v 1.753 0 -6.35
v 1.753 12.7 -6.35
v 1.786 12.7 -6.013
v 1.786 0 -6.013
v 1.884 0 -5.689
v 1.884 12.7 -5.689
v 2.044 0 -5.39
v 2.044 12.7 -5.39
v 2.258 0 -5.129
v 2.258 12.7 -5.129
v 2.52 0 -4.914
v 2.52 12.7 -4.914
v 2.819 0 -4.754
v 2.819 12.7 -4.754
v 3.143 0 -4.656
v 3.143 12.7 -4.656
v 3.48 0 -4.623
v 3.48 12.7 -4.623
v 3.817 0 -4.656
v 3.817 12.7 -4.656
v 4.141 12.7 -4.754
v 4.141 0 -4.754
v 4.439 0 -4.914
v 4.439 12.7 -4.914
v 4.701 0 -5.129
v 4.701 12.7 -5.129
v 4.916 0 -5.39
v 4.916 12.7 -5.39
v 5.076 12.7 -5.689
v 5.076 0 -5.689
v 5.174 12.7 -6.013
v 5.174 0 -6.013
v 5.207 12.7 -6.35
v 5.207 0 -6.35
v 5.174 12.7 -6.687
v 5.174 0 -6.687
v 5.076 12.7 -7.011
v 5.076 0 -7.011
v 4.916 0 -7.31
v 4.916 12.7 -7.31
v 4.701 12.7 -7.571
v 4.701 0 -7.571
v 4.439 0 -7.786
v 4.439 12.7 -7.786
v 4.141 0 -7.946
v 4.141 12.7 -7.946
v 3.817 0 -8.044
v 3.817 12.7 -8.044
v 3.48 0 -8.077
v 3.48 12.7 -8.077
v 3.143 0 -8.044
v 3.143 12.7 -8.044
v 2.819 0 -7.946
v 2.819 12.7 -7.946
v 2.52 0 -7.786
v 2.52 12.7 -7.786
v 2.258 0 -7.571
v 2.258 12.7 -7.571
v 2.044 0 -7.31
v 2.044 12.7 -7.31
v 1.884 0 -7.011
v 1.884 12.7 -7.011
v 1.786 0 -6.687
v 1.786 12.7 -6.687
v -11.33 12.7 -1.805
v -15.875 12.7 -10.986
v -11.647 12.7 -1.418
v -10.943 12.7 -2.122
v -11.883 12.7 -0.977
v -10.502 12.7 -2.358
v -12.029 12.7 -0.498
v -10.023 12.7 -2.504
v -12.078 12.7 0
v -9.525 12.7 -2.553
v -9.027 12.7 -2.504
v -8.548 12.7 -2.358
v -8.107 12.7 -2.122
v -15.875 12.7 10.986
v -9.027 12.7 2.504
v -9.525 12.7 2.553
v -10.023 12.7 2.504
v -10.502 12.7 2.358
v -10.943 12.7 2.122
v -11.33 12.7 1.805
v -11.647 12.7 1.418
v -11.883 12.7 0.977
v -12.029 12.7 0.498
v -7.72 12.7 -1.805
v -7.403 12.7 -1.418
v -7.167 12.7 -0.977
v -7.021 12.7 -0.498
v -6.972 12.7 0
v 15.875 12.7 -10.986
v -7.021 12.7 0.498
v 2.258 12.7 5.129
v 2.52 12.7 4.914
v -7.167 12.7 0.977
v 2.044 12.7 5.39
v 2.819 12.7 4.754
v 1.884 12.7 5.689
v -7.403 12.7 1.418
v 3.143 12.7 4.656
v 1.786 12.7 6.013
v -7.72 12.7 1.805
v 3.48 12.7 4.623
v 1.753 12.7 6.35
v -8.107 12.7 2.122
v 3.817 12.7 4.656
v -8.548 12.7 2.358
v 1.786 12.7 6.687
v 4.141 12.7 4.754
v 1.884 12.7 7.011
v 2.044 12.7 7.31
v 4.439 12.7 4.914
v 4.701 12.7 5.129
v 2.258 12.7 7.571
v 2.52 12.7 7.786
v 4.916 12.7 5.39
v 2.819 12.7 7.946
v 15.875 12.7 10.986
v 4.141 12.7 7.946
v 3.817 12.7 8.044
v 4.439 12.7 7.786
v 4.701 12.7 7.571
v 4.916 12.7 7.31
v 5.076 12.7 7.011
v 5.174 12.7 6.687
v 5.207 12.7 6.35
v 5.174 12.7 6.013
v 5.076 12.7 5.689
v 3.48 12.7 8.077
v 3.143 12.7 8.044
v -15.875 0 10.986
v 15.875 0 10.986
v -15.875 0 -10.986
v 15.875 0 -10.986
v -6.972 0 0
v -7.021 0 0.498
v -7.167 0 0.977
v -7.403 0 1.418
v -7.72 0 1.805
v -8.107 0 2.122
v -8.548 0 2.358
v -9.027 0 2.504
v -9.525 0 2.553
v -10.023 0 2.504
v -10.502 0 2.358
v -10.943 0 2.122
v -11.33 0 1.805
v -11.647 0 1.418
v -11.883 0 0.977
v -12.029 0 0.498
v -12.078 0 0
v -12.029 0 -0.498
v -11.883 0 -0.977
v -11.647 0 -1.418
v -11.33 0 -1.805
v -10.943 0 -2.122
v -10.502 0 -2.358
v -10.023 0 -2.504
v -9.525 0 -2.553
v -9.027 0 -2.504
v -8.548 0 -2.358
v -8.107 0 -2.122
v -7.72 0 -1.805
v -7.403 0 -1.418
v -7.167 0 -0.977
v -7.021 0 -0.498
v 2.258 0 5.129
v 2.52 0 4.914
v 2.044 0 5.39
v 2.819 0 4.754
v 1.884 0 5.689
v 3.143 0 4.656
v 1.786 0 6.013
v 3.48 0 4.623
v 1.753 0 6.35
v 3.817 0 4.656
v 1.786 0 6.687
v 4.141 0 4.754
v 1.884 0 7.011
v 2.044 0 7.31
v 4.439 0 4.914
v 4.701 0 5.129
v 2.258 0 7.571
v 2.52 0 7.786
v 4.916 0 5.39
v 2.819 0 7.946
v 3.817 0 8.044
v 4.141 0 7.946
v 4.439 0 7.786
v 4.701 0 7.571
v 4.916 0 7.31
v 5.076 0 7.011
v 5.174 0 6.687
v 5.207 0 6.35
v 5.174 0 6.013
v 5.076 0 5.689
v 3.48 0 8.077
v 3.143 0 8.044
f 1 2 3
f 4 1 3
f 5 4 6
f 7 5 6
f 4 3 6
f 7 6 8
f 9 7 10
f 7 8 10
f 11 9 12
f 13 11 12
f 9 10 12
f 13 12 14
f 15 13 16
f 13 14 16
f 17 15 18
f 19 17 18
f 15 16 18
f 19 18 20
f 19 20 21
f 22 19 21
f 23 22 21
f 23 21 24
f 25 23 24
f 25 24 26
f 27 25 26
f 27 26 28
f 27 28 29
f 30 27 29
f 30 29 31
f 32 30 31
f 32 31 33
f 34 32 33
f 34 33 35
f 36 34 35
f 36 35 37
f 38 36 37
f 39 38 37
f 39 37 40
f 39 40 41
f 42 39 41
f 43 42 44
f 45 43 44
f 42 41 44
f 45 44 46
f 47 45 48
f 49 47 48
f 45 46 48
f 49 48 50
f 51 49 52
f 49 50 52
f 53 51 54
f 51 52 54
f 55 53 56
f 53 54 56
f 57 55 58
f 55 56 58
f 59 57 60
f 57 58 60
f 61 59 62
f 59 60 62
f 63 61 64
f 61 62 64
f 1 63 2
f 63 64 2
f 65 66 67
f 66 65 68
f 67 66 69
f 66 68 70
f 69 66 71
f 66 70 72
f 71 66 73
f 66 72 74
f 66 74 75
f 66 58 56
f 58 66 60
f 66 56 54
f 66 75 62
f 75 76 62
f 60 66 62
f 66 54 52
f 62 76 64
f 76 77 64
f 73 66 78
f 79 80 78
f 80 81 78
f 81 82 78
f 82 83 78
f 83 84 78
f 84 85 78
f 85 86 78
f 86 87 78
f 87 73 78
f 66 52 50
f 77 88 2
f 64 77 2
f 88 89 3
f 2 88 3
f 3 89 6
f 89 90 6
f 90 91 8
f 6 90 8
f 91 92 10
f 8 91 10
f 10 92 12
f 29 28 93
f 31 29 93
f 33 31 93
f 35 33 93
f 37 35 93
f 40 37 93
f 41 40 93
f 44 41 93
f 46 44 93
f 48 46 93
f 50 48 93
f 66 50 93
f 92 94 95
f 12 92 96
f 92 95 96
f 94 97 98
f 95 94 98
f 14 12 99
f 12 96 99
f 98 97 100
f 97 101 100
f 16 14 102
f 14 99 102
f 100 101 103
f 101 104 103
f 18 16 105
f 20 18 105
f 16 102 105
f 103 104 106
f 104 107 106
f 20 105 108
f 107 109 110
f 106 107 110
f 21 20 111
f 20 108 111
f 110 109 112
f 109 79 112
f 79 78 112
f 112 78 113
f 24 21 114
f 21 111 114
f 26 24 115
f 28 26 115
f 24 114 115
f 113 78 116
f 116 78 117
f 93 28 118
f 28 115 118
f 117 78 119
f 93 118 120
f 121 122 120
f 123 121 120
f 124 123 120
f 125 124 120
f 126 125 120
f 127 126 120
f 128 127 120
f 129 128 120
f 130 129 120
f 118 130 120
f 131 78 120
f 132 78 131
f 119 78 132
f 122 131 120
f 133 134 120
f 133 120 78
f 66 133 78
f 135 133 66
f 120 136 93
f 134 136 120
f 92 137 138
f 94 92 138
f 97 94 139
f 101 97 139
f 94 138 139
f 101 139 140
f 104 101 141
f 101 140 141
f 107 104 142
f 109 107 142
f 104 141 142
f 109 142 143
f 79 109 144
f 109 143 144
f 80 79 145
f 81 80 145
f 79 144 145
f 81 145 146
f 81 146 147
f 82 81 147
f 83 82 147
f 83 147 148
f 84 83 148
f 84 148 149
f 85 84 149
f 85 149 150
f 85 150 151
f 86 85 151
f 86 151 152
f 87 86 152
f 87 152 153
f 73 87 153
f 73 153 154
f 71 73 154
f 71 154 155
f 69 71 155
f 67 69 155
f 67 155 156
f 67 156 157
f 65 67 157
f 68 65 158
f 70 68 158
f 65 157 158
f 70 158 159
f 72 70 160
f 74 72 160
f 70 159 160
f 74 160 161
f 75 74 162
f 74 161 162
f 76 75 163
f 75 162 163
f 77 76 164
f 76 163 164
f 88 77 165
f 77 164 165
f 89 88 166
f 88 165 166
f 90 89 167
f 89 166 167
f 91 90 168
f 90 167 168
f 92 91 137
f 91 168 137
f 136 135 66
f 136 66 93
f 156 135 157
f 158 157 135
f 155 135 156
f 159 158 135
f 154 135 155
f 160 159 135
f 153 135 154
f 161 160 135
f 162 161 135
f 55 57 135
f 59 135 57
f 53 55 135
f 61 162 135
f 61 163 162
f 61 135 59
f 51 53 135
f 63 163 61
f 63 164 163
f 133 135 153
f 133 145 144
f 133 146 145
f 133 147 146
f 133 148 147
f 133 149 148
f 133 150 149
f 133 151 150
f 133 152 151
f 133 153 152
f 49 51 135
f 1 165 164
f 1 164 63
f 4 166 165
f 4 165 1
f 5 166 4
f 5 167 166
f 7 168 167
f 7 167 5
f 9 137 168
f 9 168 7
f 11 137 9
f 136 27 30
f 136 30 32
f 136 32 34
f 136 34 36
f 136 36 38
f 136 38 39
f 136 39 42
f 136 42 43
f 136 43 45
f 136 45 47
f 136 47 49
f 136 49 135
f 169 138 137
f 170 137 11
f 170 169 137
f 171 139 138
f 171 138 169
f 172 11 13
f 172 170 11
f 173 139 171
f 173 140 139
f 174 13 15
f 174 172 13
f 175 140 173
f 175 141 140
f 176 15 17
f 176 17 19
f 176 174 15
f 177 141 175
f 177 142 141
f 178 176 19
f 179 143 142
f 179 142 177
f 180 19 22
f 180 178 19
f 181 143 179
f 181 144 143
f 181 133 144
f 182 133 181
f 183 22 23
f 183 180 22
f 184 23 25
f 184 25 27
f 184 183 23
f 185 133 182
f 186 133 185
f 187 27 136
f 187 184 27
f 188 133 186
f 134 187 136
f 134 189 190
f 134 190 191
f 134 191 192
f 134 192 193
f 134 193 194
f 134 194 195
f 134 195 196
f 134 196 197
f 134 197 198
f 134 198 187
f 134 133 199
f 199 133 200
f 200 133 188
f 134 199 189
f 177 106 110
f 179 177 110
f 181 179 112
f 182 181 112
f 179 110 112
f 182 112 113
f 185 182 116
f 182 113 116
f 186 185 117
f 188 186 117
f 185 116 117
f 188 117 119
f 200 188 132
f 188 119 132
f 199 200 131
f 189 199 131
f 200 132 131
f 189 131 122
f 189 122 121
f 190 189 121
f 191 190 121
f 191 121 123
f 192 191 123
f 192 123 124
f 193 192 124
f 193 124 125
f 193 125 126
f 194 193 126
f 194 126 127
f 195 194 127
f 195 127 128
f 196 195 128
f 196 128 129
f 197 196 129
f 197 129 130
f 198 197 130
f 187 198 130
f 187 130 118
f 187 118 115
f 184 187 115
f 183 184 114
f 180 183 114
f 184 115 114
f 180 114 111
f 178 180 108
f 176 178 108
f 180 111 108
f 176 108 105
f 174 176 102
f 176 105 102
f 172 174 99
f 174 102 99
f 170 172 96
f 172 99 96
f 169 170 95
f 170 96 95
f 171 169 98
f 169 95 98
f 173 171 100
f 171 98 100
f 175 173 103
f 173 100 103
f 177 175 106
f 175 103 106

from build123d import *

# Parameters (mm, degrees)
F0_W     = 3.4798
F0_H     = 6.35
F0_W_2   = 12.3952
F1_DEPTH = 12.7
F2_D     = 3.4544
F4_D     = 5.1054


# Not quite as in the source:
# - a feature names something its author has since deleted; it is built from what else it names


with BuildPart() as f1:
    # F0 (on Front) → F1 (new body)
    with BuildSketch(Plane.XZ):
        Polygon((0, -6.35), (0, 0), (-15.875, 0), (-15.875, -10.9855), (0, -10.9855), align=None)
        Polygon((-15.875, 0), (0, 0), (0, 6.35), (0, 10.9855), (-15.875, 10.9855), align=None)
        Polygon((0, 10.9855), (0, 6.35), (3.4798, 6.35), (15.875, 6.35), (15.875, 10.9855), align=None)
        with Locations((1.7399, 3.175)):
            Rectangle(F0_W, F0_H)
        with Locations((9.6774, 3.175)):
            Rectangle(F0_W_2, F0_H)
        with Locations((9.6774, -3.175)):
            Rectangle(F0_W_2, F0_H)
        with Locations((1.7399, -3.175)):
            Rectangle(F0_W, F0_H)
        Polygon((3.4798, -6.35), (0, -6.35), (0, -10.9855), (15.875, -10.9855), (15.875, -6.35), align=None)
    extrude(amount=-F1_DEPTH)

    # F2 (through all)
    with Locations(Plane.XZ):
        with Locations((3.4798, -6.35), (3.4798, 6.35)):
            Hole(F2_D / 2)

    # F4 (through all)
    with Locations(Plane(origin=(0, 12.7, 0), x_dir=(-1, 0, 0), z_dir=(0, 1, 0))):
        with Locations((9.525, 0)):
            Hole(F4_D / 2)


solid = f1.part
